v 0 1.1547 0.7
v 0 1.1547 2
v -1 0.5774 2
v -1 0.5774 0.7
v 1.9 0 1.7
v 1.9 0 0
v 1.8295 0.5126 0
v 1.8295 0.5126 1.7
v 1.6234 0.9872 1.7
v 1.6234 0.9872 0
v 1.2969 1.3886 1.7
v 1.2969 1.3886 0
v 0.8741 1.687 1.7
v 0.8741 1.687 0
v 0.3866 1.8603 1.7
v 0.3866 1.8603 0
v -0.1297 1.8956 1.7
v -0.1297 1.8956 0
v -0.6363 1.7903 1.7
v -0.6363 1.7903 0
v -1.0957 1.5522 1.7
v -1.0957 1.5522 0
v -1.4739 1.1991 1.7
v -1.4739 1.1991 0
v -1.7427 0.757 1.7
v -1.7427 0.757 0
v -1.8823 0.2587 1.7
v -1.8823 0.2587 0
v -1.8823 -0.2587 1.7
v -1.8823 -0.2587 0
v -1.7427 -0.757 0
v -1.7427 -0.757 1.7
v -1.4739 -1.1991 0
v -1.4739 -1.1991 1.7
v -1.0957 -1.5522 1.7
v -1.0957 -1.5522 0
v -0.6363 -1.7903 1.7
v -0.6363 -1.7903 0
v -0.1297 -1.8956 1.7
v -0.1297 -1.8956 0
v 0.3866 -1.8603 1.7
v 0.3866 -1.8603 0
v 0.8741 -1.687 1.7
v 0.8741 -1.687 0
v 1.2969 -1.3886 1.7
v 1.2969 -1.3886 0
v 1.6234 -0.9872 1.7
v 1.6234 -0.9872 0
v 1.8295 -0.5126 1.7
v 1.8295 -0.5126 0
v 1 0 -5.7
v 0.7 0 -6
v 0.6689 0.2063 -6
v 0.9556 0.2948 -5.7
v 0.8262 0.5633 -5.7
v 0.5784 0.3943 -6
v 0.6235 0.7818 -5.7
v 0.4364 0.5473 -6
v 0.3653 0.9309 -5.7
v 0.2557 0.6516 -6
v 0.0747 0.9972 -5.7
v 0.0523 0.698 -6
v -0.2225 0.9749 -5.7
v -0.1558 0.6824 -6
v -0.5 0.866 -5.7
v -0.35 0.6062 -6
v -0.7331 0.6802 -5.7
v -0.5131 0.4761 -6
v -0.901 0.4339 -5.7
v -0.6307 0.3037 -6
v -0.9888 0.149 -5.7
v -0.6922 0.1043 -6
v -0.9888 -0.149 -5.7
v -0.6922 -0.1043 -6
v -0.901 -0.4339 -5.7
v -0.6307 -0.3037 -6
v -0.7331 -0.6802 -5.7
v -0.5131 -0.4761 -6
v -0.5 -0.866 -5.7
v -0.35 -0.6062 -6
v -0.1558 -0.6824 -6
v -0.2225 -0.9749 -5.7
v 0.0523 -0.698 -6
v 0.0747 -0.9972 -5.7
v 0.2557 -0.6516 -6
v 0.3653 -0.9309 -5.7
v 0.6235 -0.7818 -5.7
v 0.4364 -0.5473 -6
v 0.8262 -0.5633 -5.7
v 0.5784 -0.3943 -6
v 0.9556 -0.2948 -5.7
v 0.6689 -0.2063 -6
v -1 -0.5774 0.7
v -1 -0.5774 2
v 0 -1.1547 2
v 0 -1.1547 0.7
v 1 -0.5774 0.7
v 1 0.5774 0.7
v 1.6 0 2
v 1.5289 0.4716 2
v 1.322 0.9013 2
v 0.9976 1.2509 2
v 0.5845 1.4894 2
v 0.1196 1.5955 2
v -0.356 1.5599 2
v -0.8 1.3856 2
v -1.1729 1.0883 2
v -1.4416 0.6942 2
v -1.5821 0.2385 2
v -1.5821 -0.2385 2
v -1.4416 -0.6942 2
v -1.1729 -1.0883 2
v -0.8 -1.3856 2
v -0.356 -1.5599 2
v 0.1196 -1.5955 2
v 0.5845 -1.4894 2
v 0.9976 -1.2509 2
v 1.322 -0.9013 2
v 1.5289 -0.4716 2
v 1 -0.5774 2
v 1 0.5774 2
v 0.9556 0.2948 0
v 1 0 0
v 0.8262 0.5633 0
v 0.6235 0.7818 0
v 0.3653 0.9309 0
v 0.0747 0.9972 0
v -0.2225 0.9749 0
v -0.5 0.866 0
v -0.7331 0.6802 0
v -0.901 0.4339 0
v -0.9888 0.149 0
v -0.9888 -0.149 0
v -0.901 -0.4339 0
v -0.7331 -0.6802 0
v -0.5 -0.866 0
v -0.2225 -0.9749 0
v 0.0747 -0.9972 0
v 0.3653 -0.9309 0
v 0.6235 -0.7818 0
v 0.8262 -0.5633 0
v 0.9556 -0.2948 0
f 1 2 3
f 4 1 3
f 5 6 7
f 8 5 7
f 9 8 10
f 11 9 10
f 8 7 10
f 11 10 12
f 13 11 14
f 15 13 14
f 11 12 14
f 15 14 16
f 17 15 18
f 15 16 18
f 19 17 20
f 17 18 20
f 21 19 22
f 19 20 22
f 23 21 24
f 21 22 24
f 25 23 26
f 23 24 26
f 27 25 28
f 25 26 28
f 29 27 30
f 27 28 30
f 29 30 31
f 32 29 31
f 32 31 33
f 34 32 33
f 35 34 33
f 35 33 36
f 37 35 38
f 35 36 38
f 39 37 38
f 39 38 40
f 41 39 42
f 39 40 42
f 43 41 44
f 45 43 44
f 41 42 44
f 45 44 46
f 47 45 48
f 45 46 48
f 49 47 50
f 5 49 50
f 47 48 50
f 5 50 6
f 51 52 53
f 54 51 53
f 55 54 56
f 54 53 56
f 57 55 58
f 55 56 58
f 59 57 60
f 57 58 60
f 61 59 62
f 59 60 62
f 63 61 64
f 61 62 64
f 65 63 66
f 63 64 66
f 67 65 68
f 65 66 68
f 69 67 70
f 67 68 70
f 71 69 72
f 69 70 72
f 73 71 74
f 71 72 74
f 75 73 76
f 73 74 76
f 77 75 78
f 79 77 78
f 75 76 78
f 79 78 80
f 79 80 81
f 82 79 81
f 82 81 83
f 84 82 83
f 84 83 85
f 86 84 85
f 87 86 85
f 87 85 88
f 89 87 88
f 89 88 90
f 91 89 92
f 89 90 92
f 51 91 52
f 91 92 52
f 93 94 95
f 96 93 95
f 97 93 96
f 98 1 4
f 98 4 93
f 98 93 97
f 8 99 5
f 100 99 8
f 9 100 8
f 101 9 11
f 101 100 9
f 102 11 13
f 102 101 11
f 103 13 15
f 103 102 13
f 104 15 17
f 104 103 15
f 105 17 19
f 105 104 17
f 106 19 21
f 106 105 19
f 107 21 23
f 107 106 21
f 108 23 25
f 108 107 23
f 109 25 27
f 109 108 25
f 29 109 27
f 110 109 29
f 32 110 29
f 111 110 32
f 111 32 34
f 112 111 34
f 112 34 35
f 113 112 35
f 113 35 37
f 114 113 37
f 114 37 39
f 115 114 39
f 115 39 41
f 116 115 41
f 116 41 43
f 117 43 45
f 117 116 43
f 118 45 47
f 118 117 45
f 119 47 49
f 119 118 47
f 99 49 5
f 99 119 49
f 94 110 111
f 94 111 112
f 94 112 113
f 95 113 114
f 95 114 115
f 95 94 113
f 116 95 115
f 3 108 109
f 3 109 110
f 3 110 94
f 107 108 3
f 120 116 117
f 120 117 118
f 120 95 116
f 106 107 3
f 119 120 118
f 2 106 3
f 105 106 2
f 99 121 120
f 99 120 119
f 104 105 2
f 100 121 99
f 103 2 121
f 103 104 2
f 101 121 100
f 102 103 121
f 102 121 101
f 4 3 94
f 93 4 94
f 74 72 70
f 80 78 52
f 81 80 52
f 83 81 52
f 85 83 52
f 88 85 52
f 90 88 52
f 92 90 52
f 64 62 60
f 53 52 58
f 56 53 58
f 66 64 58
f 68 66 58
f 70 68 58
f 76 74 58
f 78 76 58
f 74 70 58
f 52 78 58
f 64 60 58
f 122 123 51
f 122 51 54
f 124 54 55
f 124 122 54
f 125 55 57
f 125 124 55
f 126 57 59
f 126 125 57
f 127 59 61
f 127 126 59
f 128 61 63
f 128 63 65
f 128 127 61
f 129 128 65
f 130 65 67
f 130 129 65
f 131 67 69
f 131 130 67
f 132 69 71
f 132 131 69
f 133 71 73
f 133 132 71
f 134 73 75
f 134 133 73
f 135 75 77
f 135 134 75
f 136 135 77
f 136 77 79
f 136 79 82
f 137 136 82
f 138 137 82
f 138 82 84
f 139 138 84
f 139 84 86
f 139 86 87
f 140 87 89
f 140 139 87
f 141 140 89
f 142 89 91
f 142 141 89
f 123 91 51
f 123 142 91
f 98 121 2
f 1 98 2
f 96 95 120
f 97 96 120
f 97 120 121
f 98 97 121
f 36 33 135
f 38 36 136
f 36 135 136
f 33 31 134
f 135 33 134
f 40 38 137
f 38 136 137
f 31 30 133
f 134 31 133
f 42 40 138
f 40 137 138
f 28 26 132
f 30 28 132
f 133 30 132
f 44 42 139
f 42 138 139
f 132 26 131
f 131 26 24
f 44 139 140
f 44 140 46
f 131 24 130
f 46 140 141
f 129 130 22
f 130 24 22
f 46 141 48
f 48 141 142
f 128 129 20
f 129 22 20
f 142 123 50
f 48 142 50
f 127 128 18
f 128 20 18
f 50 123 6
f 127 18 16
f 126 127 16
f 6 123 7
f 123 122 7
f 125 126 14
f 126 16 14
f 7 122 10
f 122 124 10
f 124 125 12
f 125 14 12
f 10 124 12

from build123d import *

# Parameters (mm, degrees)
F2_R      = 1
F3_DEPTH  = 6
F2_R_2    = 1.9
F3_FACE_R = 1
F4_DEPTH  = 2
F5_SIZE   = 0.3
F7_DEPTH  = 1.3


with BuildPart() as f3:
    # F2 (on Top) → F3 (new body)
    with BuildSketch(Plane.XY):
        Circle(F2_R)
    extrude(amount=-F3_DEPTH)

    # F2 (on Top) + F3_face (on face) → F4 (join)
    with BuildSketch(Plane.XY):
        Circle(F2_R_2)
        Circle(F2_R, mode=Mode.SUBTRACT)
    with BuildSketch(Plane.XY):
        Circle(F3_FACE_R)
    extrude(amount=F4_DEPTH)

    # F5
    f5_edges = [f3.edges().sort_by_distance(p)[0] for p in [
        (-1, 0, -6),
        (-1.9, 0, 2),
    ]]
    chamfer(f5_edges, length=F5_SIZE)

    # F6 (on face) → F7 (cut)
    with BuildSketch(Plane.XY.offset(2)):
        Polygon((1, -0.5773502692), (1, 0.5773502692), (0, 1.1547005384), (-1, 0.5773502692), (-1, -0.5773502692), (0, -1.1547005384), align=None)
    extrude(amount=-F7_DEPTH, mode=Mode.SUBTRACT)


solid = f3.part
